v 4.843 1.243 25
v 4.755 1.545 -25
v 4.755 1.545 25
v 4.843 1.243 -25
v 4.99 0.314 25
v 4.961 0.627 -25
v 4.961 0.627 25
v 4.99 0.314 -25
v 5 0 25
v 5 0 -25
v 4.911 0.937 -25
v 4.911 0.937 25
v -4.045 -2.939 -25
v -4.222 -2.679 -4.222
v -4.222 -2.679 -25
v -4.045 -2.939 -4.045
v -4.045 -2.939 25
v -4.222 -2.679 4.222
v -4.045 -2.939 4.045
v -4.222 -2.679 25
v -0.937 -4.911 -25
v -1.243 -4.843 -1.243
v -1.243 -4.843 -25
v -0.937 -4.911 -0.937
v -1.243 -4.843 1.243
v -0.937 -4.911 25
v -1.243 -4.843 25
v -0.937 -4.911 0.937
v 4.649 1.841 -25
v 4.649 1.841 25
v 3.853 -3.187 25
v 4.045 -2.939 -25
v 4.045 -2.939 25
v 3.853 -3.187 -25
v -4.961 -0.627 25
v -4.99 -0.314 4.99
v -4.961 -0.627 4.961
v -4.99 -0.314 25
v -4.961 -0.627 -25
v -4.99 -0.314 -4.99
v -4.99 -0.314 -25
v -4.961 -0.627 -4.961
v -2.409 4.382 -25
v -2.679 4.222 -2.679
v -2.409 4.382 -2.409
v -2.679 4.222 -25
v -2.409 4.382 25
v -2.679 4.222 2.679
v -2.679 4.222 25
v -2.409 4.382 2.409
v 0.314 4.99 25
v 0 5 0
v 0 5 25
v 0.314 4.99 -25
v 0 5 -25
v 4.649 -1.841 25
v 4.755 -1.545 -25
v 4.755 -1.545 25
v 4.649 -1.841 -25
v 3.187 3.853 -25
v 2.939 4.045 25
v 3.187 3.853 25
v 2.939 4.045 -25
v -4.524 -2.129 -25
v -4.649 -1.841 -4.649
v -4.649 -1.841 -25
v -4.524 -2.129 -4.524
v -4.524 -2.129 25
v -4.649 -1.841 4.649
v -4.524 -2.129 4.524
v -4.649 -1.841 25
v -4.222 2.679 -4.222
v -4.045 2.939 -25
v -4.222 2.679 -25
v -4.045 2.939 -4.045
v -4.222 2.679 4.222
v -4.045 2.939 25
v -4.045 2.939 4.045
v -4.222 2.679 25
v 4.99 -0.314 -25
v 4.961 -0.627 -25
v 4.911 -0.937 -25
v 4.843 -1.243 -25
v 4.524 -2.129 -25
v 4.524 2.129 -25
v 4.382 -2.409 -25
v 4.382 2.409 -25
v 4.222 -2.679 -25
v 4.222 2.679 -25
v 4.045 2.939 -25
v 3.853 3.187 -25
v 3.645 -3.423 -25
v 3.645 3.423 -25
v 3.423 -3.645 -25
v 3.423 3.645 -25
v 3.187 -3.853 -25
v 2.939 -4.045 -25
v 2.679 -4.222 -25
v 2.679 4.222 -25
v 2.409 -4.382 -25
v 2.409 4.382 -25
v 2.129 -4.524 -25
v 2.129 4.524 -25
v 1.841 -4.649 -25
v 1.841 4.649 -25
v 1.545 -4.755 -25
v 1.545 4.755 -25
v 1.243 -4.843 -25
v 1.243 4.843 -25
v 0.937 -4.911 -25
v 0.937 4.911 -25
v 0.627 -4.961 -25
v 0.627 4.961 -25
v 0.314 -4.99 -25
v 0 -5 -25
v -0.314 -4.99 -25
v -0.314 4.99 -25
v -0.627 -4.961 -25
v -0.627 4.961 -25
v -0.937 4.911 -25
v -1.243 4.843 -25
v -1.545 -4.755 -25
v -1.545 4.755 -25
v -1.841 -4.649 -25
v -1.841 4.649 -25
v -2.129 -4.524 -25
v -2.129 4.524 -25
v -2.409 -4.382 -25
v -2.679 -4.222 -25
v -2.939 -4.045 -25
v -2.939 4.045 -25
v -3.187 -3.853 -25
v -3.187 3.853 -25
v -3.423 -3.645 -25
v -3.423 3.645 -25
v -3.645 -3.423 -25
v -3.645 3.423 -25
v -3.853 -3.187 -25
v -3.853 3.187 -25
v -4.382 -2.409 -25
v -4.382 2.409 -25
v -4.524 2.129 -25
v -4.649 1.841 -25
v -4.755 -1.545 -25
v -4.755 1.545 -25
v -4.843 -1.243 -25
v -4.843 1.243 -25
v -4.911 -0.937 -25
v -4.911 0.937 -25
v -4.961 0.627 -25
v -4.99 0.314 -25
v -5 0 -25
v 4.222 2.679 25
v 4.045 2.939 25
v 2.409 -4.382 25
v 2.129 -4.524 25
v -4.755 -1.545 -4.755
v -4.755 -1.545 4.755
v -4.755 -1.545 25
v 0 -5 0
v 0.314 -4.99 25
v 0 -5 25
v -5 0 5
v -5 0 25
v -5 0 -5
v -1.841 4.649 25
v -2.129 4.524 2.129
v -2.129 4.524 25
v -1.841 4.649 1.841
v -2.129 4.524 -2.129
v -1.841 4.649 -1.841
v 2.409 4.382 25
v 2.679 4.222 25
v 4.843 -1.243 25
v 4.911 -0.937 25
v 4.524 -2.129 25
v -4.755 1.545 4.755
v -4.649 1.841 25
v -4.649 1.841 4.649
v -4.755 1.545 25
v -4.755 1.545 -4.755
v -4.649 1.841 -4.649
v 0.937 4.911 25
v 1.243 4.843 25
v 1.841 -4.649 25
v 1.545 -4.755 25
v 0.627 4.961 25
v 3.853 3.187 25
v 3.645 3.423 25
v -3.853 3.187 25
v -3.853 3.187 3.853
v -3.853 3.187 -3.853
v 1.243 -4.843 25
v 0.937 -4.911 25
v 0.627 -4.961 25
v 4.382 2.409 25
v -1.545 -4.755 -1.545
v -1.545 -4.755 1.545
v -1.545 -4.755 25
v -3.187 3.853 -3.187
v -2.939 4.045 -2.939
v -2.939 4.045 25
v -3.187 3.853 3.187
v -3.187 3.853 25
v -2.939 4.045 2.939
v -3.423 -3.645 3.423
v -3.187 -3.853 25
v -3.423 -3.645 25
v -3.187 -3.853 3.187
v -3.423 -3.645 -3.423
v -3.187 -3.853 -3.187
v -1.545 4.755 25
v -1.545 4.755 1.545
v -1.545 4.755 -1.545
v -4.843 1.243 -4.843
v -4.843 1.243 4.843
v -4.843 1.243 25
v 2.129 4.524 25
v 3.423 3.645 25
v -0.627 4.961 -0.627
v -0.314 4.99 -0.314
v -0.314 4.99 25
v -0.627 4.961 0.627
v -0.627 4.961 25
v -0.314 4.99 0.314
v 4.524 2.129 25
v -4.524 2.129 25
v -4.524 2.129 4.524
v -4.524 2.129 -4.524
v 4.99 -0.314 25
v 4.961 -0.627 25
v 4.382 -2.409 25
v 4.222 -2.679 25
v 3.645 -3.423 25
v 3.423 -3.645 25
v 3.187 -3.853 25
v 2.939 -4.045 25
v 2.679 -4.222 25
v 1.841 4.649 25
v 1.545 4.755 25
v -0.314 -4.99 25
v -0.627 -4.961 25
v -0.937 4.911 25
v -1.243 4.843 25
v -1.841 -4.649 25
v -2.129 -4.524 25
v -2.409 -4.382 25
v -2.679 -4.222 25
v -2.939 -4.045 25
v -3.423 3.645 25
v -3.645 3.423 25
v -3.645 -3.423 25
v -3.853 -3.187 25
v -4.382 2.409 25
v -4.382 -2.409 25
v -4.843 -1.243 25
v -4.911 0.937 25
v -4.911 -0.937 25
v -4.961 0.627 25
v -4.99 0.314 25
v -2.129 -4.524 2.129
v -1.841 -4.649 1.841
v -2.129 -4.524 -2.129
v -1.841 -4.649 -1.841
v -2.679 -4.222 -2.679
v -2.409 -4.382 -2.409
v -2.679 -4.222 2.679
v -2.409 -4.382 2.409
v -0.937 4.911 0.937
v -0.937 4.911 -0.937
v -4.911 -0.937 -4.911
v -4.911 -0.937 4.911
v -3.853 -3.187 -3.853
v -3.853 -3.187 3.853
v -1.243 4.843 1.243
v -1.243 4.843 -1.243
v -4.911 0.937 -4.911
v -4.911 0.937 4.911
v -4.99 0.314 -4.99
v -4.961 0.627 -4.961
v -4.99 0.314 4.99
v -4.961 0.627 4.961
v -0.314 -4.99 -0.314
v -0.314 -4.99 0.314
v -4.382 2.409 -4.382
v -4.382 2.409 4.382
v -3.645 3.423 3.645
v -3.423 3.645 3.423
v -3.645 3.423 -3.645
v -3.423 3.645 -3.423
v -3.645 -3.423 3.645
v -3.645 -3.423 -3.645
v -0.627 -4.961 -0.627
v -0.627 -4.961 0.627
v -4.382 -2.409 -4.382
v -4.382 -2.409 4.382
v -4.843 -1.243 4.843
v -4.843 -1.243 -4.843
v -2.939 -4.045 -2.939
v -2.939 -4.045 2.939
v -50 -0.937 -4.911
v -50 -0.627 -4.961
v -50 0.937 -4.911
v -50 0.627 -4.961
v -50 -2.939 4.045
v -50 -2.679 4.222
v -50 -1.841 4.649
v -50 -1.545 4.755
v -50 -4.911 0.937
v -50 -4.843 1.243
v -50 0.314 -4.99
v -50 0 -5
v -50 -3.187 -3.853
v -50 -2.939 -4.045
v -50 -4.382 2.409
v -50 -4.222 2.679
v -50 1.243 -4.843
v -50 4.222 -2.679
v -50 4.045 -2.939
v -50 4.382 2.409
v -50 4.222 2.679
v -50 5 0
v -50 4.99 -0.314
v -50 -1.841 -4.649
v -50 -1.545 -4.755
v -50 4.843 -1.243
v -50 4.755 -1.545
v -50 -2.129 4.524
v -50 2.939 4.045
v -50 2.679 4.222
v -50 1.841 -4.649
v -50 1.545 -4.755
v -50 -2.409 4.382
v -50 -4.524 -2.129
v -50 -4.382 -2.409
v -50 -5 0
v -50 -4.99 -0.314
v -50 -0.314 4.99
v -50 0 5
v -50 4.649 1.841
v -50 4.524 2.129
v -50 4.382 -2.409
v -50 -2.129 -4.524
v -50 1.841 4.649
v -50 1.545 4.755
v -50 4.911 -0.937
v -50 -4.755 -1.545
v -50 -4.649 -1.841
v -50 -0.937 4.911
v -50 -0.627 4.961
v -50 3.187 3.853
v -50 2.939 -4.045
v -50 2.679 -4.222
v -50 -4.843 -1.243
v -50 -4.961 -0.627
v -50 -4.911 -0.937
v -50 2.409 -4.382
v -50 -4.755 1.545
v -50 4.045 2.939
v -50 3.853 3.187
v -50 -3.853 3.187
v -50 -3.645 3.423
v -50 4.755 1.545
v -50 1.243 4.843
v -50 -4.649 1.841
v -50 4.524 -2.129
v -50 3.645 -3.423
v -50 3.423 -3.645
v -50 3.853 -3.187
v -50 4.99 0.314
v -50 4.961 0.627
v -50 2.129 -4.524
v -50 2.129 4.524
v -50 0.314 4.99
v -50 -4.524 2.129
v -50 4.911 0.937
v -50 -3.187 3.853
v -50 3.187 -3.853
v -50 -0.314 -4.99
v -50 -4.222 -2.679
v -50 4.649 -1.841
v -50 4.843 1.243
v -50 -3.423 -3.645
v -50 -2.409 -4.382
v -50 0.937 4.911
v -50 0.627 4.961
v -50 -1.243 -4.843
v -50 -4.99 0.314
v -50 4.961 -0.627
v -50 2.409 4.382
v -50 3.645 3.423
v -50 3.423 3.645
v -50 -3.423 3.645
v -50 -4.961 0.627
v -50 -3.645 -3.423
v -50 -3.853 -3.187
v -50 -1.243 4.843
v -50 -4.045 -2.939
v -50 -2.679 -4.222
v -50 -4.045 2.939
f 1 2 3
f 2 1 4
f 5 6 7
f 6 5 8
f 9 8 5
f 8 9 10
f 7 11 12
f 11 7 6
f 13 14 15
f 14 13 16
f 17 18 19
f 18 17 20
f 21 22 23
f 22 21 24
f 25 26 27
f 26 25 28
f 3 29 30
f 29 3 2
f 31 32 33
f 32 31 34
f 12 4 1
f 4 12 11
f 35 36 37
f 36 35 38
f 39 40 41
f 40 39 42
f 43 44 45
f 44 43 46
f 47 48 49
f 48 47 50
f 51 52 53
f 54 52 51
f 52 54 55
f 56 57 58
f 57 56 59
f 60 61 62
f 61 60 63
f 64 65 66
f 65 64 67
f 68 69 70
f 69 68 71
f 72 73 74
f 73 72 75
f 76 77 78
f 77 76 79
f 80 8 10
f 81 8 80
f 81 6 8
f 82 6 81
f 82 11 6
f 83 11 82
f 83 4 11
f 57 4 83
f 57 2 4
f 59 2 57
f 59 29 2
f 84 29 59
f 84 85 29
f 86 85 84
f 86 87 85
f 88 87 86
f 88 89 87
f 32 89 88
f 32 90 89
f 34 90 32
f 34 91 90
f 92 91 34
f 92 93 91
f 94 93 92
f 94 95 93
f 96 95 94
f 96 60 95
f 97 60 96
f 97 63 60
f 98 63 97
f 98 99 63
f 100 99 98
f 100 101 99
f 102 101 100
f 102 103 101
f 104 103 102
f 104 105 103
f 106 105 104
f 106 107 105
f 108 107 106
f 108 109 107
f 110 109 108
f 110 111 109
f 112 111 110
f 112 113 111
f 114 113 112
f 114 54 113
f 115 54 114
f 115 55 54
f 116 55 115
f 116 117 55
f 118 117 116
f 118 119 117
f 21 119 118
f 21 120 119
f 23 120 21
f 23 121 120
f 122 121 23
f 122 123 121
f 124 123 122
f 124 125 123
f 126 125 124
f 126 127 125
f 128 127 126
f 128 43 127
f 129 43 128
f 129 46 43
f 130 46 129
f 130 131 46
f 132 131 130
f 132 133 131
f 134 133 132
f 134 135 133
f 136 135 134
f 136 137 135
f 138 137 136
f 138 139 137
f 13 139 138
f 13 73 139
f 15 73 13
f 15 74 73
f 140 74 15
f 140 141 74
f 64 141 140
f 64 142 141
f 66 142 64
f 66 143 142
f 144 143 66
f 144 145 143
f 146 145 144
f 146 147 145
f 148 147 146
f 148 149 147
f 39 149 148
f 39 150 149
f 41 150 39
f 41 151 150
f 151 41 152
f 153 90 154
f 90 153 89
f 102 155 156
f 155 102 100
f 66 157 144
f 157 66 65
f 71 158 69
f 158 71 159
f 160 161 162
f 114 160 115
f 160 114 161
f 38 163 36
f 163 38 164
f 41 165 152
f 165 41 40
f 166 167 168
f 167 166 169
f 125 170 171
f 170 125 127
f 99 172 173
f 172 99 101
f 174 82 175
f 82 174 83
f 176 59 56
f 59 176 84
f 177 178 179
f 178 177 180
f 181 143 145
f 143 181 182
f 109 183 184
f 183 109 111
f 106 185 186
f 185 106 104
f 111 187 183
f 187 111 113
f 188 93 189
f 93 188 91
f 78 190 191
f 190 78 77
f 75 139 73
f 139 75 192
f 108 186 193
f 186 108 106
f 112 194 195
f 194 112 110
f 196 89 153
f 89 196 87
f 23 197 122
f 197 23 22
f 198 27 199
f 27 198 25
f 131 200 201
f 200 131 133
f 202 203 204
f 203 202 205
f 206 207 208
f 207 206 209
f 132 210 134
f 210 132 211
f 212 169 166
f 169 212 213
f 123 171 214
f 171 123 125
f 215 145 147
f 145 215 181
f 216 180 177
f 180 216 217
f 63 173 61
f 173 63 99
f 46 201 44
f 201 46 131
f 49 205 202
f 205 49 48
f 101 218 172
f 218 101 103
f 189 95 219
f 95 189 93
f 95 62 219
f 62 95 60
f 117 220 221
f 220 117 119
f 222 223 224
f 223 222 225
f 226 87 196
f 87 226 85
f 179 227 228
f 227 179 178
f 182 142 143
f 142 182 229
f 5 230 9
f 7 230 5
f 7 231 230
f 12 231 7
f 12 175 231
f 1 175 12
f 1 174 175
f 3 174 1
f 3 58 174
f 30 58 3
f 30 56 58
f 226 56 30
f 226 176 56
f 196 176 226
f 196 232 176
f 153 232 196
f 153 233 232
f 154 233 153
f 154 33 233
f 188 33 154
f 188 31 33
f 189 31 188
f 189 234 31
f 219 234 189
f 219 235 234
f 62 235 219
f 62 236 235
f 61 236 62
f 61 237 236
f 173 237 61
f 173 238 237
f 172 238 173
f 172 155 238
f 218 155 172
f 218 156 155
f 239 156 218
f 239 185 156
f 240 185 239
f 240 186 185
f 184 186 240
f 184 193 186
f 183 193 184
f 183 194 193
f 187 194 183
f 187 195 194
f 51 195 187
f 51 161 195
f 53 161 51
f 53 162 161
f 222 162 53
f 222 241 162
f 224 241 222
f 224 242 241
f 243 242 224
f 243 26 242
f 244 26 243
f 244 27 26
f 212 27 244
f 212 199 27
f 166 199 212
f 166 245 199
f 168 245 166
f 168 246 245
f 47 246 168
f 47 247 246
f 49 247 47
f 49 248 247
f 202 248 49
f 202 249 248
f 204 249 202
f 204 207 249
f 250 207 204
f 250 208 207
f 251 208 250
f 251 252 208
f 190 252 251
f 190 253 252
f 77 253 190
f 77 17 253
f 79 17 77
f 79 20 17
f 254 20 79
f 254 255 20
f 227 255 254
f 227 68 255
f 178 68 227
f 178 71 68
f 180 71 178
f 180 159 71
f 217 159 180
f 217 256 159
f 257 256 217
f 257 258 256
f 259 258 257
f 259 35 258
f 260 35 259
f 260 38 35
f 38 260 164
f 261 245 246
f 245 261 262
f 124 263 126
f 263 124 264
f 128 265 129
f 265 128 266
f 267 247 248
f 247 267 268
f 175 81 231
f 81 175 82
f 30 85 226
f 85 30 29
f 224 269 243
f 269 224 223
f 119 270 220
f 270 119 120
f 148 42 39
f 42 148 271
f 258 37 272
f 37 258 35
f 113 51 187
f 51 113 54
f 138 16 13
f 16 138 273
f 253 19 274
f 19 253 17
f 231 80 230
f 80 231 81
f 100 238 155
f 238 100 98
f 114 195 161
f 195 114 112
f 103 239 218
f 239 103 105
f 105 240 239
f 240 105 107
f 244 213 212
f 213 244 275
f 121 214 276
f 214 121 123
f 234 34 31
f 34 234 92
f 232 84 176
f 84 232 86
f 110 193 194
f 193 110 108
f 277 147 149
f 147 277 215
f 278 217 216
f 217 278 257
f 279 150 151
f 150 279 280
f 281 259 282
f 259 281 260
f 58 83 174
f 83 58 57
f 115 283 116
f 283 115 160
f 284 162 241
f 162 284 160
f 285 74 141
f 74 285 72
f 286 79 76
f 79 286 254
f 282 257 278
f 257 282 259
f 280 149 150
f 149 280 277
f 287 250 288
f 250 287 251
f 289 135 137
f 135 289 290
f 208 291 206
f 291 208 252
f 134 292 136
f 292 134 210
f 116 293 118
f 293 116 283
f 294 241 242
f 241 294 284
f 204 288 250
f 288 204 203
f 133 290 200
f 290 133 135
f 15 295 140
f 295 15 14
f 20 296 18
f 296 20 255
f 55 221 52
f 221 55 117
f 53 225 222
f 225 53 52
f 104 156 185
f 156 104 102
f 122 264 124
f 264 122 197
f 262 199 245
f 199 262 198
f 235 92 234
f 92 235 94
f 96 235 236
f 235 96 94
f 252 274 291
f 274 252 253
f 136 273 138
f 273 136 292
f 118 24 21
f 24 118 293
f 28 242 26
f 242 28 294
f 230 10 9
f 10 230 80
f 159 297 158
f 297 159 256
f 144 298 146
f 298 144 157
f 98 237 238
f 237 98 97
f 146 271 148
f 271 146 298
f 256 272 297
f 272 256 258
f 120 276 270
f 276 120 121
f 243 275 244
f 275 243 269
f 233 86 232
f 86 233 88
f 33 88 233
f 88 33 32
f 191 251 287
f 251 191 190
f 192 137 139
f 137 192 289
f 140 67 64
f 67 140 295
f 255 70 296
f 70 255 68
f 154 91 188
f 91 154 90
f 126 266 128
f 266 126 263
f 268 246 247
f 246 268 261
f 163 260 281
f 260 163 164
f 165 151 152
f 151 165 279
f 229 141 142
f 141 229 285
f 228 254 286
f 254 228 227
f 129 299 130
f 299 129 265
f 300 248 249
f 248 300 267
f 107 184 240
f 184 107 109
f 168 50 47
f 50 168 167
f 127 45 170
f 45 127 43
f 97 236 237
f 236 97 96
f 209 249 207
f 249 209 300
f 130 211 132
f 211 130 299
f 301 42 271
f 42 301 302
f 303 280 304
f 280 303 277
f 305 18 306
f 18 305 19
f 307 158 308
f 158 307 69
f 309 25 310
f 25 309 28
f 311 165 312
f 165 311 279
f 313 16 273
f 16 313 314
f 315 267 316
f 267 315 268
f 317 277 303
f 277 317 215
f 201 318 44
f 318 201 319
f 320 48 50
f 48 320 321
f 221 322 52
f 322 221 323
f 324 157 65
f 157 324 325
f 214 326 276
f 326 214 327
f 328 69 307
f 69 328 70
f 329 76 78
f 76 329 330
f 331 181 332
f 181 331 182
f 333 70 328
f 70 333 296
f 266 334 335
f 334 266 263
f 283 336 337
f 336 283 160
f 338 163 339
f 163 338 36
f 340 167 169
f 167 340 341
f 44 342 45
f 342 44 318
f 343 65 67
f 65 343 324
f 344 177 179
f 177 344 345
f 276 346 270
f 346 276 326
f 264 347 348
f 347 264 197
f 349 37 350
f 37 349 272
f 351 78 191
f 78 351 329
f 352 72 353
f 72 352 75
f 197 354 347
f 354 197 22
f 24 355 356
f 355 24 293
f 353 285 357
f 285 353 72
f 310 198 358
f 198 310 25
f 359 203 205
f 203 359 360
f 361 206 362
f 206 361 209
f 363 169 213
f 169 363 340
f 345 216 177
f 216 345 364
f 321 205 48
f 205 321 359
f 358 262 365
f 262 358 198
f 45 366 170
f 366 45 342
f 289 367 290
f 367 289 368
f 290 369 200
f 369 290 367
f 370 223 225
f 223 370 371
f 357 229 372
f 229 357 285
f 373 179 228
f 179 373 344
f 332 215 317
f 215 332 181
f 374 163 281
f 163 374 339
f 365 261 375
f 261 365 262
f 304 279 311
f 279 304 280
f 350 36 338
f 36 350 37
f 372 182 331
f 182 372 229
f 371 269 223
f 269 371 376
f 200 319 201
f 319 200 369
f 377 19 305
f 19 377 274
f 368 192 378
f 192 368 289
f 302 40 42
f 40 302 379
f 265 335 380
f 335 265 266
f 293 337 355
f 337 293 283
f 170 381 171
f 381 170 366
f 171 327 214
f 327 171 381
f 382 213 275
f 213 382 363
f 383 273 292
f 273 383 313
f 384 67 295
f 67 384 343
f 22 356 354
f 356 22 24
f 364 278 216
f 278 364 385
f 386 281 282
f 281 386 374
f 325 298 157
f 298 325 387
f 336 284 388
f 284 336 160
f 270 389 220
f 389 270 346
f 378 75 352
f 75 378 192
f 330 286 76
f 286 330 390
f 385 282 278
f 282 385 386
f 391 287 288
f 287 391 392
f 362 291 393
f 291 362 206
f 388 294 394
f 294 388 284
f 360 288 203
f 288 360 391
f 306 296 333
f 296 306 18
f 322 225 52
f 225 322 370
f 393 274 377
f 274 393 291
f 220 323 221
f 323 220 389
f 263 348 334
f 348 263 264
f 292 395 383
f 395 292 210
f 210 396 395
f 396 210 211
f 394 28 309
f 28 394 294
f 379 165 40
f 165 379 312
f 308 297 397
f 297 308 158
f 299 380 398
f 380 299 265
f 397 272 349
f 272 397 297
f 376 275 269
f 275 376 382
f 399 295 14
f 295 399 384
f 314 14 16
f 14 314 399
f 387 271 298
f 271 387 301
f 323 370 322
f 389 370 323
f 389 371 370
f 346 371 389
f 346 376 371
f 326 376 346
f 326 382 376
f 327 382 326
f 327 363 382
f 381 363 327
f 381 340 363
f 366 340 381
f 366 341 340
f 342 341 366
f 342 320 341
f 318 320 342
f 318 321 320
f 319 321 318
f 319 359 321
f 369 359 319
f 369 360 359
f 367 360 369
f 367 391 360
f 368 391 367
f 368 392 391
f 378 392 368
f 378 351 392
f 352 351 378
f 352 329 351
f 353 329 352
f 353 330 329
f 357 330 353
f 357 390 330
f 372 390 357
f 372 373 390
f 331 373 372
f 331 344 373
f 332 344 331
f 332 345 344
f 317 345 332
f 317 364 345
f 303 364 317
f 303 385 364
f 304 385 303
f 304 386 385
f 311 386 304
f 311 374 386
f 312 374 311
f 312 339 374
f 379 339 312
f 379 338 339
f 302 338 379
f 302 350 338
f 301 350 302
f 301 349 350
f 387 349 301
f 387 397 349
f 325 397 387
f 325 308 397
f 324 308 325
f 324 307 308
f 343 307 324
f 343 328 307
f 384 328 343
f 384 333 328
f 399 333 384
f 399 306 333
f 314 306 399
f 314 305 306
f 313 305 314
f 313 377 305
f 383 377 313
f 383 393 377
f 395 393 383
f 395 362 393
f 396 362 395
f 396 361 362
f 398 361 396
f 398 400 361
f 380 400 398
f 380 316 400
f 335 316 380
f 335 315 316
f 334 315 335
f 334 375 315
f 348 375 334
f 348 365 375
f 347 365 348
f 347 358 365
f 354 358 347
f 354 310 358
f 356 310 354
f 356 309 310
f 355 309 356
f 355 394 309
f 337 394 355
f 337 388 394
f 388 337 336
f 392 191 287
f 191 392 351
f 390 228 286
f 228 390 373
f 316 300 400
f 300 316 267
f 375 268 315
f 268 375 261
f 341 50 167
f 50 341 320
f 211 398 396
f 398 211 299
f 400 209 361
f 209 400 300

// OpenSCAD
/* 
	Supplemental T-Junction 3

*/

$fn = 100;  // Increase the resolution of the cylinders
pipe_radius = 5;
pipe_length = 50;

// Pipe along the x-axis
translate([0, 0, 0])
cylinder(h=pipe_length, r=pipe_radius, center=true);

// Pipe along the y-axis
rotate([0, 90, 0])
translate([0, 0, -pipe_length/2])
cylinder(h=pipe_length, r=pipe_radius, center=true);
